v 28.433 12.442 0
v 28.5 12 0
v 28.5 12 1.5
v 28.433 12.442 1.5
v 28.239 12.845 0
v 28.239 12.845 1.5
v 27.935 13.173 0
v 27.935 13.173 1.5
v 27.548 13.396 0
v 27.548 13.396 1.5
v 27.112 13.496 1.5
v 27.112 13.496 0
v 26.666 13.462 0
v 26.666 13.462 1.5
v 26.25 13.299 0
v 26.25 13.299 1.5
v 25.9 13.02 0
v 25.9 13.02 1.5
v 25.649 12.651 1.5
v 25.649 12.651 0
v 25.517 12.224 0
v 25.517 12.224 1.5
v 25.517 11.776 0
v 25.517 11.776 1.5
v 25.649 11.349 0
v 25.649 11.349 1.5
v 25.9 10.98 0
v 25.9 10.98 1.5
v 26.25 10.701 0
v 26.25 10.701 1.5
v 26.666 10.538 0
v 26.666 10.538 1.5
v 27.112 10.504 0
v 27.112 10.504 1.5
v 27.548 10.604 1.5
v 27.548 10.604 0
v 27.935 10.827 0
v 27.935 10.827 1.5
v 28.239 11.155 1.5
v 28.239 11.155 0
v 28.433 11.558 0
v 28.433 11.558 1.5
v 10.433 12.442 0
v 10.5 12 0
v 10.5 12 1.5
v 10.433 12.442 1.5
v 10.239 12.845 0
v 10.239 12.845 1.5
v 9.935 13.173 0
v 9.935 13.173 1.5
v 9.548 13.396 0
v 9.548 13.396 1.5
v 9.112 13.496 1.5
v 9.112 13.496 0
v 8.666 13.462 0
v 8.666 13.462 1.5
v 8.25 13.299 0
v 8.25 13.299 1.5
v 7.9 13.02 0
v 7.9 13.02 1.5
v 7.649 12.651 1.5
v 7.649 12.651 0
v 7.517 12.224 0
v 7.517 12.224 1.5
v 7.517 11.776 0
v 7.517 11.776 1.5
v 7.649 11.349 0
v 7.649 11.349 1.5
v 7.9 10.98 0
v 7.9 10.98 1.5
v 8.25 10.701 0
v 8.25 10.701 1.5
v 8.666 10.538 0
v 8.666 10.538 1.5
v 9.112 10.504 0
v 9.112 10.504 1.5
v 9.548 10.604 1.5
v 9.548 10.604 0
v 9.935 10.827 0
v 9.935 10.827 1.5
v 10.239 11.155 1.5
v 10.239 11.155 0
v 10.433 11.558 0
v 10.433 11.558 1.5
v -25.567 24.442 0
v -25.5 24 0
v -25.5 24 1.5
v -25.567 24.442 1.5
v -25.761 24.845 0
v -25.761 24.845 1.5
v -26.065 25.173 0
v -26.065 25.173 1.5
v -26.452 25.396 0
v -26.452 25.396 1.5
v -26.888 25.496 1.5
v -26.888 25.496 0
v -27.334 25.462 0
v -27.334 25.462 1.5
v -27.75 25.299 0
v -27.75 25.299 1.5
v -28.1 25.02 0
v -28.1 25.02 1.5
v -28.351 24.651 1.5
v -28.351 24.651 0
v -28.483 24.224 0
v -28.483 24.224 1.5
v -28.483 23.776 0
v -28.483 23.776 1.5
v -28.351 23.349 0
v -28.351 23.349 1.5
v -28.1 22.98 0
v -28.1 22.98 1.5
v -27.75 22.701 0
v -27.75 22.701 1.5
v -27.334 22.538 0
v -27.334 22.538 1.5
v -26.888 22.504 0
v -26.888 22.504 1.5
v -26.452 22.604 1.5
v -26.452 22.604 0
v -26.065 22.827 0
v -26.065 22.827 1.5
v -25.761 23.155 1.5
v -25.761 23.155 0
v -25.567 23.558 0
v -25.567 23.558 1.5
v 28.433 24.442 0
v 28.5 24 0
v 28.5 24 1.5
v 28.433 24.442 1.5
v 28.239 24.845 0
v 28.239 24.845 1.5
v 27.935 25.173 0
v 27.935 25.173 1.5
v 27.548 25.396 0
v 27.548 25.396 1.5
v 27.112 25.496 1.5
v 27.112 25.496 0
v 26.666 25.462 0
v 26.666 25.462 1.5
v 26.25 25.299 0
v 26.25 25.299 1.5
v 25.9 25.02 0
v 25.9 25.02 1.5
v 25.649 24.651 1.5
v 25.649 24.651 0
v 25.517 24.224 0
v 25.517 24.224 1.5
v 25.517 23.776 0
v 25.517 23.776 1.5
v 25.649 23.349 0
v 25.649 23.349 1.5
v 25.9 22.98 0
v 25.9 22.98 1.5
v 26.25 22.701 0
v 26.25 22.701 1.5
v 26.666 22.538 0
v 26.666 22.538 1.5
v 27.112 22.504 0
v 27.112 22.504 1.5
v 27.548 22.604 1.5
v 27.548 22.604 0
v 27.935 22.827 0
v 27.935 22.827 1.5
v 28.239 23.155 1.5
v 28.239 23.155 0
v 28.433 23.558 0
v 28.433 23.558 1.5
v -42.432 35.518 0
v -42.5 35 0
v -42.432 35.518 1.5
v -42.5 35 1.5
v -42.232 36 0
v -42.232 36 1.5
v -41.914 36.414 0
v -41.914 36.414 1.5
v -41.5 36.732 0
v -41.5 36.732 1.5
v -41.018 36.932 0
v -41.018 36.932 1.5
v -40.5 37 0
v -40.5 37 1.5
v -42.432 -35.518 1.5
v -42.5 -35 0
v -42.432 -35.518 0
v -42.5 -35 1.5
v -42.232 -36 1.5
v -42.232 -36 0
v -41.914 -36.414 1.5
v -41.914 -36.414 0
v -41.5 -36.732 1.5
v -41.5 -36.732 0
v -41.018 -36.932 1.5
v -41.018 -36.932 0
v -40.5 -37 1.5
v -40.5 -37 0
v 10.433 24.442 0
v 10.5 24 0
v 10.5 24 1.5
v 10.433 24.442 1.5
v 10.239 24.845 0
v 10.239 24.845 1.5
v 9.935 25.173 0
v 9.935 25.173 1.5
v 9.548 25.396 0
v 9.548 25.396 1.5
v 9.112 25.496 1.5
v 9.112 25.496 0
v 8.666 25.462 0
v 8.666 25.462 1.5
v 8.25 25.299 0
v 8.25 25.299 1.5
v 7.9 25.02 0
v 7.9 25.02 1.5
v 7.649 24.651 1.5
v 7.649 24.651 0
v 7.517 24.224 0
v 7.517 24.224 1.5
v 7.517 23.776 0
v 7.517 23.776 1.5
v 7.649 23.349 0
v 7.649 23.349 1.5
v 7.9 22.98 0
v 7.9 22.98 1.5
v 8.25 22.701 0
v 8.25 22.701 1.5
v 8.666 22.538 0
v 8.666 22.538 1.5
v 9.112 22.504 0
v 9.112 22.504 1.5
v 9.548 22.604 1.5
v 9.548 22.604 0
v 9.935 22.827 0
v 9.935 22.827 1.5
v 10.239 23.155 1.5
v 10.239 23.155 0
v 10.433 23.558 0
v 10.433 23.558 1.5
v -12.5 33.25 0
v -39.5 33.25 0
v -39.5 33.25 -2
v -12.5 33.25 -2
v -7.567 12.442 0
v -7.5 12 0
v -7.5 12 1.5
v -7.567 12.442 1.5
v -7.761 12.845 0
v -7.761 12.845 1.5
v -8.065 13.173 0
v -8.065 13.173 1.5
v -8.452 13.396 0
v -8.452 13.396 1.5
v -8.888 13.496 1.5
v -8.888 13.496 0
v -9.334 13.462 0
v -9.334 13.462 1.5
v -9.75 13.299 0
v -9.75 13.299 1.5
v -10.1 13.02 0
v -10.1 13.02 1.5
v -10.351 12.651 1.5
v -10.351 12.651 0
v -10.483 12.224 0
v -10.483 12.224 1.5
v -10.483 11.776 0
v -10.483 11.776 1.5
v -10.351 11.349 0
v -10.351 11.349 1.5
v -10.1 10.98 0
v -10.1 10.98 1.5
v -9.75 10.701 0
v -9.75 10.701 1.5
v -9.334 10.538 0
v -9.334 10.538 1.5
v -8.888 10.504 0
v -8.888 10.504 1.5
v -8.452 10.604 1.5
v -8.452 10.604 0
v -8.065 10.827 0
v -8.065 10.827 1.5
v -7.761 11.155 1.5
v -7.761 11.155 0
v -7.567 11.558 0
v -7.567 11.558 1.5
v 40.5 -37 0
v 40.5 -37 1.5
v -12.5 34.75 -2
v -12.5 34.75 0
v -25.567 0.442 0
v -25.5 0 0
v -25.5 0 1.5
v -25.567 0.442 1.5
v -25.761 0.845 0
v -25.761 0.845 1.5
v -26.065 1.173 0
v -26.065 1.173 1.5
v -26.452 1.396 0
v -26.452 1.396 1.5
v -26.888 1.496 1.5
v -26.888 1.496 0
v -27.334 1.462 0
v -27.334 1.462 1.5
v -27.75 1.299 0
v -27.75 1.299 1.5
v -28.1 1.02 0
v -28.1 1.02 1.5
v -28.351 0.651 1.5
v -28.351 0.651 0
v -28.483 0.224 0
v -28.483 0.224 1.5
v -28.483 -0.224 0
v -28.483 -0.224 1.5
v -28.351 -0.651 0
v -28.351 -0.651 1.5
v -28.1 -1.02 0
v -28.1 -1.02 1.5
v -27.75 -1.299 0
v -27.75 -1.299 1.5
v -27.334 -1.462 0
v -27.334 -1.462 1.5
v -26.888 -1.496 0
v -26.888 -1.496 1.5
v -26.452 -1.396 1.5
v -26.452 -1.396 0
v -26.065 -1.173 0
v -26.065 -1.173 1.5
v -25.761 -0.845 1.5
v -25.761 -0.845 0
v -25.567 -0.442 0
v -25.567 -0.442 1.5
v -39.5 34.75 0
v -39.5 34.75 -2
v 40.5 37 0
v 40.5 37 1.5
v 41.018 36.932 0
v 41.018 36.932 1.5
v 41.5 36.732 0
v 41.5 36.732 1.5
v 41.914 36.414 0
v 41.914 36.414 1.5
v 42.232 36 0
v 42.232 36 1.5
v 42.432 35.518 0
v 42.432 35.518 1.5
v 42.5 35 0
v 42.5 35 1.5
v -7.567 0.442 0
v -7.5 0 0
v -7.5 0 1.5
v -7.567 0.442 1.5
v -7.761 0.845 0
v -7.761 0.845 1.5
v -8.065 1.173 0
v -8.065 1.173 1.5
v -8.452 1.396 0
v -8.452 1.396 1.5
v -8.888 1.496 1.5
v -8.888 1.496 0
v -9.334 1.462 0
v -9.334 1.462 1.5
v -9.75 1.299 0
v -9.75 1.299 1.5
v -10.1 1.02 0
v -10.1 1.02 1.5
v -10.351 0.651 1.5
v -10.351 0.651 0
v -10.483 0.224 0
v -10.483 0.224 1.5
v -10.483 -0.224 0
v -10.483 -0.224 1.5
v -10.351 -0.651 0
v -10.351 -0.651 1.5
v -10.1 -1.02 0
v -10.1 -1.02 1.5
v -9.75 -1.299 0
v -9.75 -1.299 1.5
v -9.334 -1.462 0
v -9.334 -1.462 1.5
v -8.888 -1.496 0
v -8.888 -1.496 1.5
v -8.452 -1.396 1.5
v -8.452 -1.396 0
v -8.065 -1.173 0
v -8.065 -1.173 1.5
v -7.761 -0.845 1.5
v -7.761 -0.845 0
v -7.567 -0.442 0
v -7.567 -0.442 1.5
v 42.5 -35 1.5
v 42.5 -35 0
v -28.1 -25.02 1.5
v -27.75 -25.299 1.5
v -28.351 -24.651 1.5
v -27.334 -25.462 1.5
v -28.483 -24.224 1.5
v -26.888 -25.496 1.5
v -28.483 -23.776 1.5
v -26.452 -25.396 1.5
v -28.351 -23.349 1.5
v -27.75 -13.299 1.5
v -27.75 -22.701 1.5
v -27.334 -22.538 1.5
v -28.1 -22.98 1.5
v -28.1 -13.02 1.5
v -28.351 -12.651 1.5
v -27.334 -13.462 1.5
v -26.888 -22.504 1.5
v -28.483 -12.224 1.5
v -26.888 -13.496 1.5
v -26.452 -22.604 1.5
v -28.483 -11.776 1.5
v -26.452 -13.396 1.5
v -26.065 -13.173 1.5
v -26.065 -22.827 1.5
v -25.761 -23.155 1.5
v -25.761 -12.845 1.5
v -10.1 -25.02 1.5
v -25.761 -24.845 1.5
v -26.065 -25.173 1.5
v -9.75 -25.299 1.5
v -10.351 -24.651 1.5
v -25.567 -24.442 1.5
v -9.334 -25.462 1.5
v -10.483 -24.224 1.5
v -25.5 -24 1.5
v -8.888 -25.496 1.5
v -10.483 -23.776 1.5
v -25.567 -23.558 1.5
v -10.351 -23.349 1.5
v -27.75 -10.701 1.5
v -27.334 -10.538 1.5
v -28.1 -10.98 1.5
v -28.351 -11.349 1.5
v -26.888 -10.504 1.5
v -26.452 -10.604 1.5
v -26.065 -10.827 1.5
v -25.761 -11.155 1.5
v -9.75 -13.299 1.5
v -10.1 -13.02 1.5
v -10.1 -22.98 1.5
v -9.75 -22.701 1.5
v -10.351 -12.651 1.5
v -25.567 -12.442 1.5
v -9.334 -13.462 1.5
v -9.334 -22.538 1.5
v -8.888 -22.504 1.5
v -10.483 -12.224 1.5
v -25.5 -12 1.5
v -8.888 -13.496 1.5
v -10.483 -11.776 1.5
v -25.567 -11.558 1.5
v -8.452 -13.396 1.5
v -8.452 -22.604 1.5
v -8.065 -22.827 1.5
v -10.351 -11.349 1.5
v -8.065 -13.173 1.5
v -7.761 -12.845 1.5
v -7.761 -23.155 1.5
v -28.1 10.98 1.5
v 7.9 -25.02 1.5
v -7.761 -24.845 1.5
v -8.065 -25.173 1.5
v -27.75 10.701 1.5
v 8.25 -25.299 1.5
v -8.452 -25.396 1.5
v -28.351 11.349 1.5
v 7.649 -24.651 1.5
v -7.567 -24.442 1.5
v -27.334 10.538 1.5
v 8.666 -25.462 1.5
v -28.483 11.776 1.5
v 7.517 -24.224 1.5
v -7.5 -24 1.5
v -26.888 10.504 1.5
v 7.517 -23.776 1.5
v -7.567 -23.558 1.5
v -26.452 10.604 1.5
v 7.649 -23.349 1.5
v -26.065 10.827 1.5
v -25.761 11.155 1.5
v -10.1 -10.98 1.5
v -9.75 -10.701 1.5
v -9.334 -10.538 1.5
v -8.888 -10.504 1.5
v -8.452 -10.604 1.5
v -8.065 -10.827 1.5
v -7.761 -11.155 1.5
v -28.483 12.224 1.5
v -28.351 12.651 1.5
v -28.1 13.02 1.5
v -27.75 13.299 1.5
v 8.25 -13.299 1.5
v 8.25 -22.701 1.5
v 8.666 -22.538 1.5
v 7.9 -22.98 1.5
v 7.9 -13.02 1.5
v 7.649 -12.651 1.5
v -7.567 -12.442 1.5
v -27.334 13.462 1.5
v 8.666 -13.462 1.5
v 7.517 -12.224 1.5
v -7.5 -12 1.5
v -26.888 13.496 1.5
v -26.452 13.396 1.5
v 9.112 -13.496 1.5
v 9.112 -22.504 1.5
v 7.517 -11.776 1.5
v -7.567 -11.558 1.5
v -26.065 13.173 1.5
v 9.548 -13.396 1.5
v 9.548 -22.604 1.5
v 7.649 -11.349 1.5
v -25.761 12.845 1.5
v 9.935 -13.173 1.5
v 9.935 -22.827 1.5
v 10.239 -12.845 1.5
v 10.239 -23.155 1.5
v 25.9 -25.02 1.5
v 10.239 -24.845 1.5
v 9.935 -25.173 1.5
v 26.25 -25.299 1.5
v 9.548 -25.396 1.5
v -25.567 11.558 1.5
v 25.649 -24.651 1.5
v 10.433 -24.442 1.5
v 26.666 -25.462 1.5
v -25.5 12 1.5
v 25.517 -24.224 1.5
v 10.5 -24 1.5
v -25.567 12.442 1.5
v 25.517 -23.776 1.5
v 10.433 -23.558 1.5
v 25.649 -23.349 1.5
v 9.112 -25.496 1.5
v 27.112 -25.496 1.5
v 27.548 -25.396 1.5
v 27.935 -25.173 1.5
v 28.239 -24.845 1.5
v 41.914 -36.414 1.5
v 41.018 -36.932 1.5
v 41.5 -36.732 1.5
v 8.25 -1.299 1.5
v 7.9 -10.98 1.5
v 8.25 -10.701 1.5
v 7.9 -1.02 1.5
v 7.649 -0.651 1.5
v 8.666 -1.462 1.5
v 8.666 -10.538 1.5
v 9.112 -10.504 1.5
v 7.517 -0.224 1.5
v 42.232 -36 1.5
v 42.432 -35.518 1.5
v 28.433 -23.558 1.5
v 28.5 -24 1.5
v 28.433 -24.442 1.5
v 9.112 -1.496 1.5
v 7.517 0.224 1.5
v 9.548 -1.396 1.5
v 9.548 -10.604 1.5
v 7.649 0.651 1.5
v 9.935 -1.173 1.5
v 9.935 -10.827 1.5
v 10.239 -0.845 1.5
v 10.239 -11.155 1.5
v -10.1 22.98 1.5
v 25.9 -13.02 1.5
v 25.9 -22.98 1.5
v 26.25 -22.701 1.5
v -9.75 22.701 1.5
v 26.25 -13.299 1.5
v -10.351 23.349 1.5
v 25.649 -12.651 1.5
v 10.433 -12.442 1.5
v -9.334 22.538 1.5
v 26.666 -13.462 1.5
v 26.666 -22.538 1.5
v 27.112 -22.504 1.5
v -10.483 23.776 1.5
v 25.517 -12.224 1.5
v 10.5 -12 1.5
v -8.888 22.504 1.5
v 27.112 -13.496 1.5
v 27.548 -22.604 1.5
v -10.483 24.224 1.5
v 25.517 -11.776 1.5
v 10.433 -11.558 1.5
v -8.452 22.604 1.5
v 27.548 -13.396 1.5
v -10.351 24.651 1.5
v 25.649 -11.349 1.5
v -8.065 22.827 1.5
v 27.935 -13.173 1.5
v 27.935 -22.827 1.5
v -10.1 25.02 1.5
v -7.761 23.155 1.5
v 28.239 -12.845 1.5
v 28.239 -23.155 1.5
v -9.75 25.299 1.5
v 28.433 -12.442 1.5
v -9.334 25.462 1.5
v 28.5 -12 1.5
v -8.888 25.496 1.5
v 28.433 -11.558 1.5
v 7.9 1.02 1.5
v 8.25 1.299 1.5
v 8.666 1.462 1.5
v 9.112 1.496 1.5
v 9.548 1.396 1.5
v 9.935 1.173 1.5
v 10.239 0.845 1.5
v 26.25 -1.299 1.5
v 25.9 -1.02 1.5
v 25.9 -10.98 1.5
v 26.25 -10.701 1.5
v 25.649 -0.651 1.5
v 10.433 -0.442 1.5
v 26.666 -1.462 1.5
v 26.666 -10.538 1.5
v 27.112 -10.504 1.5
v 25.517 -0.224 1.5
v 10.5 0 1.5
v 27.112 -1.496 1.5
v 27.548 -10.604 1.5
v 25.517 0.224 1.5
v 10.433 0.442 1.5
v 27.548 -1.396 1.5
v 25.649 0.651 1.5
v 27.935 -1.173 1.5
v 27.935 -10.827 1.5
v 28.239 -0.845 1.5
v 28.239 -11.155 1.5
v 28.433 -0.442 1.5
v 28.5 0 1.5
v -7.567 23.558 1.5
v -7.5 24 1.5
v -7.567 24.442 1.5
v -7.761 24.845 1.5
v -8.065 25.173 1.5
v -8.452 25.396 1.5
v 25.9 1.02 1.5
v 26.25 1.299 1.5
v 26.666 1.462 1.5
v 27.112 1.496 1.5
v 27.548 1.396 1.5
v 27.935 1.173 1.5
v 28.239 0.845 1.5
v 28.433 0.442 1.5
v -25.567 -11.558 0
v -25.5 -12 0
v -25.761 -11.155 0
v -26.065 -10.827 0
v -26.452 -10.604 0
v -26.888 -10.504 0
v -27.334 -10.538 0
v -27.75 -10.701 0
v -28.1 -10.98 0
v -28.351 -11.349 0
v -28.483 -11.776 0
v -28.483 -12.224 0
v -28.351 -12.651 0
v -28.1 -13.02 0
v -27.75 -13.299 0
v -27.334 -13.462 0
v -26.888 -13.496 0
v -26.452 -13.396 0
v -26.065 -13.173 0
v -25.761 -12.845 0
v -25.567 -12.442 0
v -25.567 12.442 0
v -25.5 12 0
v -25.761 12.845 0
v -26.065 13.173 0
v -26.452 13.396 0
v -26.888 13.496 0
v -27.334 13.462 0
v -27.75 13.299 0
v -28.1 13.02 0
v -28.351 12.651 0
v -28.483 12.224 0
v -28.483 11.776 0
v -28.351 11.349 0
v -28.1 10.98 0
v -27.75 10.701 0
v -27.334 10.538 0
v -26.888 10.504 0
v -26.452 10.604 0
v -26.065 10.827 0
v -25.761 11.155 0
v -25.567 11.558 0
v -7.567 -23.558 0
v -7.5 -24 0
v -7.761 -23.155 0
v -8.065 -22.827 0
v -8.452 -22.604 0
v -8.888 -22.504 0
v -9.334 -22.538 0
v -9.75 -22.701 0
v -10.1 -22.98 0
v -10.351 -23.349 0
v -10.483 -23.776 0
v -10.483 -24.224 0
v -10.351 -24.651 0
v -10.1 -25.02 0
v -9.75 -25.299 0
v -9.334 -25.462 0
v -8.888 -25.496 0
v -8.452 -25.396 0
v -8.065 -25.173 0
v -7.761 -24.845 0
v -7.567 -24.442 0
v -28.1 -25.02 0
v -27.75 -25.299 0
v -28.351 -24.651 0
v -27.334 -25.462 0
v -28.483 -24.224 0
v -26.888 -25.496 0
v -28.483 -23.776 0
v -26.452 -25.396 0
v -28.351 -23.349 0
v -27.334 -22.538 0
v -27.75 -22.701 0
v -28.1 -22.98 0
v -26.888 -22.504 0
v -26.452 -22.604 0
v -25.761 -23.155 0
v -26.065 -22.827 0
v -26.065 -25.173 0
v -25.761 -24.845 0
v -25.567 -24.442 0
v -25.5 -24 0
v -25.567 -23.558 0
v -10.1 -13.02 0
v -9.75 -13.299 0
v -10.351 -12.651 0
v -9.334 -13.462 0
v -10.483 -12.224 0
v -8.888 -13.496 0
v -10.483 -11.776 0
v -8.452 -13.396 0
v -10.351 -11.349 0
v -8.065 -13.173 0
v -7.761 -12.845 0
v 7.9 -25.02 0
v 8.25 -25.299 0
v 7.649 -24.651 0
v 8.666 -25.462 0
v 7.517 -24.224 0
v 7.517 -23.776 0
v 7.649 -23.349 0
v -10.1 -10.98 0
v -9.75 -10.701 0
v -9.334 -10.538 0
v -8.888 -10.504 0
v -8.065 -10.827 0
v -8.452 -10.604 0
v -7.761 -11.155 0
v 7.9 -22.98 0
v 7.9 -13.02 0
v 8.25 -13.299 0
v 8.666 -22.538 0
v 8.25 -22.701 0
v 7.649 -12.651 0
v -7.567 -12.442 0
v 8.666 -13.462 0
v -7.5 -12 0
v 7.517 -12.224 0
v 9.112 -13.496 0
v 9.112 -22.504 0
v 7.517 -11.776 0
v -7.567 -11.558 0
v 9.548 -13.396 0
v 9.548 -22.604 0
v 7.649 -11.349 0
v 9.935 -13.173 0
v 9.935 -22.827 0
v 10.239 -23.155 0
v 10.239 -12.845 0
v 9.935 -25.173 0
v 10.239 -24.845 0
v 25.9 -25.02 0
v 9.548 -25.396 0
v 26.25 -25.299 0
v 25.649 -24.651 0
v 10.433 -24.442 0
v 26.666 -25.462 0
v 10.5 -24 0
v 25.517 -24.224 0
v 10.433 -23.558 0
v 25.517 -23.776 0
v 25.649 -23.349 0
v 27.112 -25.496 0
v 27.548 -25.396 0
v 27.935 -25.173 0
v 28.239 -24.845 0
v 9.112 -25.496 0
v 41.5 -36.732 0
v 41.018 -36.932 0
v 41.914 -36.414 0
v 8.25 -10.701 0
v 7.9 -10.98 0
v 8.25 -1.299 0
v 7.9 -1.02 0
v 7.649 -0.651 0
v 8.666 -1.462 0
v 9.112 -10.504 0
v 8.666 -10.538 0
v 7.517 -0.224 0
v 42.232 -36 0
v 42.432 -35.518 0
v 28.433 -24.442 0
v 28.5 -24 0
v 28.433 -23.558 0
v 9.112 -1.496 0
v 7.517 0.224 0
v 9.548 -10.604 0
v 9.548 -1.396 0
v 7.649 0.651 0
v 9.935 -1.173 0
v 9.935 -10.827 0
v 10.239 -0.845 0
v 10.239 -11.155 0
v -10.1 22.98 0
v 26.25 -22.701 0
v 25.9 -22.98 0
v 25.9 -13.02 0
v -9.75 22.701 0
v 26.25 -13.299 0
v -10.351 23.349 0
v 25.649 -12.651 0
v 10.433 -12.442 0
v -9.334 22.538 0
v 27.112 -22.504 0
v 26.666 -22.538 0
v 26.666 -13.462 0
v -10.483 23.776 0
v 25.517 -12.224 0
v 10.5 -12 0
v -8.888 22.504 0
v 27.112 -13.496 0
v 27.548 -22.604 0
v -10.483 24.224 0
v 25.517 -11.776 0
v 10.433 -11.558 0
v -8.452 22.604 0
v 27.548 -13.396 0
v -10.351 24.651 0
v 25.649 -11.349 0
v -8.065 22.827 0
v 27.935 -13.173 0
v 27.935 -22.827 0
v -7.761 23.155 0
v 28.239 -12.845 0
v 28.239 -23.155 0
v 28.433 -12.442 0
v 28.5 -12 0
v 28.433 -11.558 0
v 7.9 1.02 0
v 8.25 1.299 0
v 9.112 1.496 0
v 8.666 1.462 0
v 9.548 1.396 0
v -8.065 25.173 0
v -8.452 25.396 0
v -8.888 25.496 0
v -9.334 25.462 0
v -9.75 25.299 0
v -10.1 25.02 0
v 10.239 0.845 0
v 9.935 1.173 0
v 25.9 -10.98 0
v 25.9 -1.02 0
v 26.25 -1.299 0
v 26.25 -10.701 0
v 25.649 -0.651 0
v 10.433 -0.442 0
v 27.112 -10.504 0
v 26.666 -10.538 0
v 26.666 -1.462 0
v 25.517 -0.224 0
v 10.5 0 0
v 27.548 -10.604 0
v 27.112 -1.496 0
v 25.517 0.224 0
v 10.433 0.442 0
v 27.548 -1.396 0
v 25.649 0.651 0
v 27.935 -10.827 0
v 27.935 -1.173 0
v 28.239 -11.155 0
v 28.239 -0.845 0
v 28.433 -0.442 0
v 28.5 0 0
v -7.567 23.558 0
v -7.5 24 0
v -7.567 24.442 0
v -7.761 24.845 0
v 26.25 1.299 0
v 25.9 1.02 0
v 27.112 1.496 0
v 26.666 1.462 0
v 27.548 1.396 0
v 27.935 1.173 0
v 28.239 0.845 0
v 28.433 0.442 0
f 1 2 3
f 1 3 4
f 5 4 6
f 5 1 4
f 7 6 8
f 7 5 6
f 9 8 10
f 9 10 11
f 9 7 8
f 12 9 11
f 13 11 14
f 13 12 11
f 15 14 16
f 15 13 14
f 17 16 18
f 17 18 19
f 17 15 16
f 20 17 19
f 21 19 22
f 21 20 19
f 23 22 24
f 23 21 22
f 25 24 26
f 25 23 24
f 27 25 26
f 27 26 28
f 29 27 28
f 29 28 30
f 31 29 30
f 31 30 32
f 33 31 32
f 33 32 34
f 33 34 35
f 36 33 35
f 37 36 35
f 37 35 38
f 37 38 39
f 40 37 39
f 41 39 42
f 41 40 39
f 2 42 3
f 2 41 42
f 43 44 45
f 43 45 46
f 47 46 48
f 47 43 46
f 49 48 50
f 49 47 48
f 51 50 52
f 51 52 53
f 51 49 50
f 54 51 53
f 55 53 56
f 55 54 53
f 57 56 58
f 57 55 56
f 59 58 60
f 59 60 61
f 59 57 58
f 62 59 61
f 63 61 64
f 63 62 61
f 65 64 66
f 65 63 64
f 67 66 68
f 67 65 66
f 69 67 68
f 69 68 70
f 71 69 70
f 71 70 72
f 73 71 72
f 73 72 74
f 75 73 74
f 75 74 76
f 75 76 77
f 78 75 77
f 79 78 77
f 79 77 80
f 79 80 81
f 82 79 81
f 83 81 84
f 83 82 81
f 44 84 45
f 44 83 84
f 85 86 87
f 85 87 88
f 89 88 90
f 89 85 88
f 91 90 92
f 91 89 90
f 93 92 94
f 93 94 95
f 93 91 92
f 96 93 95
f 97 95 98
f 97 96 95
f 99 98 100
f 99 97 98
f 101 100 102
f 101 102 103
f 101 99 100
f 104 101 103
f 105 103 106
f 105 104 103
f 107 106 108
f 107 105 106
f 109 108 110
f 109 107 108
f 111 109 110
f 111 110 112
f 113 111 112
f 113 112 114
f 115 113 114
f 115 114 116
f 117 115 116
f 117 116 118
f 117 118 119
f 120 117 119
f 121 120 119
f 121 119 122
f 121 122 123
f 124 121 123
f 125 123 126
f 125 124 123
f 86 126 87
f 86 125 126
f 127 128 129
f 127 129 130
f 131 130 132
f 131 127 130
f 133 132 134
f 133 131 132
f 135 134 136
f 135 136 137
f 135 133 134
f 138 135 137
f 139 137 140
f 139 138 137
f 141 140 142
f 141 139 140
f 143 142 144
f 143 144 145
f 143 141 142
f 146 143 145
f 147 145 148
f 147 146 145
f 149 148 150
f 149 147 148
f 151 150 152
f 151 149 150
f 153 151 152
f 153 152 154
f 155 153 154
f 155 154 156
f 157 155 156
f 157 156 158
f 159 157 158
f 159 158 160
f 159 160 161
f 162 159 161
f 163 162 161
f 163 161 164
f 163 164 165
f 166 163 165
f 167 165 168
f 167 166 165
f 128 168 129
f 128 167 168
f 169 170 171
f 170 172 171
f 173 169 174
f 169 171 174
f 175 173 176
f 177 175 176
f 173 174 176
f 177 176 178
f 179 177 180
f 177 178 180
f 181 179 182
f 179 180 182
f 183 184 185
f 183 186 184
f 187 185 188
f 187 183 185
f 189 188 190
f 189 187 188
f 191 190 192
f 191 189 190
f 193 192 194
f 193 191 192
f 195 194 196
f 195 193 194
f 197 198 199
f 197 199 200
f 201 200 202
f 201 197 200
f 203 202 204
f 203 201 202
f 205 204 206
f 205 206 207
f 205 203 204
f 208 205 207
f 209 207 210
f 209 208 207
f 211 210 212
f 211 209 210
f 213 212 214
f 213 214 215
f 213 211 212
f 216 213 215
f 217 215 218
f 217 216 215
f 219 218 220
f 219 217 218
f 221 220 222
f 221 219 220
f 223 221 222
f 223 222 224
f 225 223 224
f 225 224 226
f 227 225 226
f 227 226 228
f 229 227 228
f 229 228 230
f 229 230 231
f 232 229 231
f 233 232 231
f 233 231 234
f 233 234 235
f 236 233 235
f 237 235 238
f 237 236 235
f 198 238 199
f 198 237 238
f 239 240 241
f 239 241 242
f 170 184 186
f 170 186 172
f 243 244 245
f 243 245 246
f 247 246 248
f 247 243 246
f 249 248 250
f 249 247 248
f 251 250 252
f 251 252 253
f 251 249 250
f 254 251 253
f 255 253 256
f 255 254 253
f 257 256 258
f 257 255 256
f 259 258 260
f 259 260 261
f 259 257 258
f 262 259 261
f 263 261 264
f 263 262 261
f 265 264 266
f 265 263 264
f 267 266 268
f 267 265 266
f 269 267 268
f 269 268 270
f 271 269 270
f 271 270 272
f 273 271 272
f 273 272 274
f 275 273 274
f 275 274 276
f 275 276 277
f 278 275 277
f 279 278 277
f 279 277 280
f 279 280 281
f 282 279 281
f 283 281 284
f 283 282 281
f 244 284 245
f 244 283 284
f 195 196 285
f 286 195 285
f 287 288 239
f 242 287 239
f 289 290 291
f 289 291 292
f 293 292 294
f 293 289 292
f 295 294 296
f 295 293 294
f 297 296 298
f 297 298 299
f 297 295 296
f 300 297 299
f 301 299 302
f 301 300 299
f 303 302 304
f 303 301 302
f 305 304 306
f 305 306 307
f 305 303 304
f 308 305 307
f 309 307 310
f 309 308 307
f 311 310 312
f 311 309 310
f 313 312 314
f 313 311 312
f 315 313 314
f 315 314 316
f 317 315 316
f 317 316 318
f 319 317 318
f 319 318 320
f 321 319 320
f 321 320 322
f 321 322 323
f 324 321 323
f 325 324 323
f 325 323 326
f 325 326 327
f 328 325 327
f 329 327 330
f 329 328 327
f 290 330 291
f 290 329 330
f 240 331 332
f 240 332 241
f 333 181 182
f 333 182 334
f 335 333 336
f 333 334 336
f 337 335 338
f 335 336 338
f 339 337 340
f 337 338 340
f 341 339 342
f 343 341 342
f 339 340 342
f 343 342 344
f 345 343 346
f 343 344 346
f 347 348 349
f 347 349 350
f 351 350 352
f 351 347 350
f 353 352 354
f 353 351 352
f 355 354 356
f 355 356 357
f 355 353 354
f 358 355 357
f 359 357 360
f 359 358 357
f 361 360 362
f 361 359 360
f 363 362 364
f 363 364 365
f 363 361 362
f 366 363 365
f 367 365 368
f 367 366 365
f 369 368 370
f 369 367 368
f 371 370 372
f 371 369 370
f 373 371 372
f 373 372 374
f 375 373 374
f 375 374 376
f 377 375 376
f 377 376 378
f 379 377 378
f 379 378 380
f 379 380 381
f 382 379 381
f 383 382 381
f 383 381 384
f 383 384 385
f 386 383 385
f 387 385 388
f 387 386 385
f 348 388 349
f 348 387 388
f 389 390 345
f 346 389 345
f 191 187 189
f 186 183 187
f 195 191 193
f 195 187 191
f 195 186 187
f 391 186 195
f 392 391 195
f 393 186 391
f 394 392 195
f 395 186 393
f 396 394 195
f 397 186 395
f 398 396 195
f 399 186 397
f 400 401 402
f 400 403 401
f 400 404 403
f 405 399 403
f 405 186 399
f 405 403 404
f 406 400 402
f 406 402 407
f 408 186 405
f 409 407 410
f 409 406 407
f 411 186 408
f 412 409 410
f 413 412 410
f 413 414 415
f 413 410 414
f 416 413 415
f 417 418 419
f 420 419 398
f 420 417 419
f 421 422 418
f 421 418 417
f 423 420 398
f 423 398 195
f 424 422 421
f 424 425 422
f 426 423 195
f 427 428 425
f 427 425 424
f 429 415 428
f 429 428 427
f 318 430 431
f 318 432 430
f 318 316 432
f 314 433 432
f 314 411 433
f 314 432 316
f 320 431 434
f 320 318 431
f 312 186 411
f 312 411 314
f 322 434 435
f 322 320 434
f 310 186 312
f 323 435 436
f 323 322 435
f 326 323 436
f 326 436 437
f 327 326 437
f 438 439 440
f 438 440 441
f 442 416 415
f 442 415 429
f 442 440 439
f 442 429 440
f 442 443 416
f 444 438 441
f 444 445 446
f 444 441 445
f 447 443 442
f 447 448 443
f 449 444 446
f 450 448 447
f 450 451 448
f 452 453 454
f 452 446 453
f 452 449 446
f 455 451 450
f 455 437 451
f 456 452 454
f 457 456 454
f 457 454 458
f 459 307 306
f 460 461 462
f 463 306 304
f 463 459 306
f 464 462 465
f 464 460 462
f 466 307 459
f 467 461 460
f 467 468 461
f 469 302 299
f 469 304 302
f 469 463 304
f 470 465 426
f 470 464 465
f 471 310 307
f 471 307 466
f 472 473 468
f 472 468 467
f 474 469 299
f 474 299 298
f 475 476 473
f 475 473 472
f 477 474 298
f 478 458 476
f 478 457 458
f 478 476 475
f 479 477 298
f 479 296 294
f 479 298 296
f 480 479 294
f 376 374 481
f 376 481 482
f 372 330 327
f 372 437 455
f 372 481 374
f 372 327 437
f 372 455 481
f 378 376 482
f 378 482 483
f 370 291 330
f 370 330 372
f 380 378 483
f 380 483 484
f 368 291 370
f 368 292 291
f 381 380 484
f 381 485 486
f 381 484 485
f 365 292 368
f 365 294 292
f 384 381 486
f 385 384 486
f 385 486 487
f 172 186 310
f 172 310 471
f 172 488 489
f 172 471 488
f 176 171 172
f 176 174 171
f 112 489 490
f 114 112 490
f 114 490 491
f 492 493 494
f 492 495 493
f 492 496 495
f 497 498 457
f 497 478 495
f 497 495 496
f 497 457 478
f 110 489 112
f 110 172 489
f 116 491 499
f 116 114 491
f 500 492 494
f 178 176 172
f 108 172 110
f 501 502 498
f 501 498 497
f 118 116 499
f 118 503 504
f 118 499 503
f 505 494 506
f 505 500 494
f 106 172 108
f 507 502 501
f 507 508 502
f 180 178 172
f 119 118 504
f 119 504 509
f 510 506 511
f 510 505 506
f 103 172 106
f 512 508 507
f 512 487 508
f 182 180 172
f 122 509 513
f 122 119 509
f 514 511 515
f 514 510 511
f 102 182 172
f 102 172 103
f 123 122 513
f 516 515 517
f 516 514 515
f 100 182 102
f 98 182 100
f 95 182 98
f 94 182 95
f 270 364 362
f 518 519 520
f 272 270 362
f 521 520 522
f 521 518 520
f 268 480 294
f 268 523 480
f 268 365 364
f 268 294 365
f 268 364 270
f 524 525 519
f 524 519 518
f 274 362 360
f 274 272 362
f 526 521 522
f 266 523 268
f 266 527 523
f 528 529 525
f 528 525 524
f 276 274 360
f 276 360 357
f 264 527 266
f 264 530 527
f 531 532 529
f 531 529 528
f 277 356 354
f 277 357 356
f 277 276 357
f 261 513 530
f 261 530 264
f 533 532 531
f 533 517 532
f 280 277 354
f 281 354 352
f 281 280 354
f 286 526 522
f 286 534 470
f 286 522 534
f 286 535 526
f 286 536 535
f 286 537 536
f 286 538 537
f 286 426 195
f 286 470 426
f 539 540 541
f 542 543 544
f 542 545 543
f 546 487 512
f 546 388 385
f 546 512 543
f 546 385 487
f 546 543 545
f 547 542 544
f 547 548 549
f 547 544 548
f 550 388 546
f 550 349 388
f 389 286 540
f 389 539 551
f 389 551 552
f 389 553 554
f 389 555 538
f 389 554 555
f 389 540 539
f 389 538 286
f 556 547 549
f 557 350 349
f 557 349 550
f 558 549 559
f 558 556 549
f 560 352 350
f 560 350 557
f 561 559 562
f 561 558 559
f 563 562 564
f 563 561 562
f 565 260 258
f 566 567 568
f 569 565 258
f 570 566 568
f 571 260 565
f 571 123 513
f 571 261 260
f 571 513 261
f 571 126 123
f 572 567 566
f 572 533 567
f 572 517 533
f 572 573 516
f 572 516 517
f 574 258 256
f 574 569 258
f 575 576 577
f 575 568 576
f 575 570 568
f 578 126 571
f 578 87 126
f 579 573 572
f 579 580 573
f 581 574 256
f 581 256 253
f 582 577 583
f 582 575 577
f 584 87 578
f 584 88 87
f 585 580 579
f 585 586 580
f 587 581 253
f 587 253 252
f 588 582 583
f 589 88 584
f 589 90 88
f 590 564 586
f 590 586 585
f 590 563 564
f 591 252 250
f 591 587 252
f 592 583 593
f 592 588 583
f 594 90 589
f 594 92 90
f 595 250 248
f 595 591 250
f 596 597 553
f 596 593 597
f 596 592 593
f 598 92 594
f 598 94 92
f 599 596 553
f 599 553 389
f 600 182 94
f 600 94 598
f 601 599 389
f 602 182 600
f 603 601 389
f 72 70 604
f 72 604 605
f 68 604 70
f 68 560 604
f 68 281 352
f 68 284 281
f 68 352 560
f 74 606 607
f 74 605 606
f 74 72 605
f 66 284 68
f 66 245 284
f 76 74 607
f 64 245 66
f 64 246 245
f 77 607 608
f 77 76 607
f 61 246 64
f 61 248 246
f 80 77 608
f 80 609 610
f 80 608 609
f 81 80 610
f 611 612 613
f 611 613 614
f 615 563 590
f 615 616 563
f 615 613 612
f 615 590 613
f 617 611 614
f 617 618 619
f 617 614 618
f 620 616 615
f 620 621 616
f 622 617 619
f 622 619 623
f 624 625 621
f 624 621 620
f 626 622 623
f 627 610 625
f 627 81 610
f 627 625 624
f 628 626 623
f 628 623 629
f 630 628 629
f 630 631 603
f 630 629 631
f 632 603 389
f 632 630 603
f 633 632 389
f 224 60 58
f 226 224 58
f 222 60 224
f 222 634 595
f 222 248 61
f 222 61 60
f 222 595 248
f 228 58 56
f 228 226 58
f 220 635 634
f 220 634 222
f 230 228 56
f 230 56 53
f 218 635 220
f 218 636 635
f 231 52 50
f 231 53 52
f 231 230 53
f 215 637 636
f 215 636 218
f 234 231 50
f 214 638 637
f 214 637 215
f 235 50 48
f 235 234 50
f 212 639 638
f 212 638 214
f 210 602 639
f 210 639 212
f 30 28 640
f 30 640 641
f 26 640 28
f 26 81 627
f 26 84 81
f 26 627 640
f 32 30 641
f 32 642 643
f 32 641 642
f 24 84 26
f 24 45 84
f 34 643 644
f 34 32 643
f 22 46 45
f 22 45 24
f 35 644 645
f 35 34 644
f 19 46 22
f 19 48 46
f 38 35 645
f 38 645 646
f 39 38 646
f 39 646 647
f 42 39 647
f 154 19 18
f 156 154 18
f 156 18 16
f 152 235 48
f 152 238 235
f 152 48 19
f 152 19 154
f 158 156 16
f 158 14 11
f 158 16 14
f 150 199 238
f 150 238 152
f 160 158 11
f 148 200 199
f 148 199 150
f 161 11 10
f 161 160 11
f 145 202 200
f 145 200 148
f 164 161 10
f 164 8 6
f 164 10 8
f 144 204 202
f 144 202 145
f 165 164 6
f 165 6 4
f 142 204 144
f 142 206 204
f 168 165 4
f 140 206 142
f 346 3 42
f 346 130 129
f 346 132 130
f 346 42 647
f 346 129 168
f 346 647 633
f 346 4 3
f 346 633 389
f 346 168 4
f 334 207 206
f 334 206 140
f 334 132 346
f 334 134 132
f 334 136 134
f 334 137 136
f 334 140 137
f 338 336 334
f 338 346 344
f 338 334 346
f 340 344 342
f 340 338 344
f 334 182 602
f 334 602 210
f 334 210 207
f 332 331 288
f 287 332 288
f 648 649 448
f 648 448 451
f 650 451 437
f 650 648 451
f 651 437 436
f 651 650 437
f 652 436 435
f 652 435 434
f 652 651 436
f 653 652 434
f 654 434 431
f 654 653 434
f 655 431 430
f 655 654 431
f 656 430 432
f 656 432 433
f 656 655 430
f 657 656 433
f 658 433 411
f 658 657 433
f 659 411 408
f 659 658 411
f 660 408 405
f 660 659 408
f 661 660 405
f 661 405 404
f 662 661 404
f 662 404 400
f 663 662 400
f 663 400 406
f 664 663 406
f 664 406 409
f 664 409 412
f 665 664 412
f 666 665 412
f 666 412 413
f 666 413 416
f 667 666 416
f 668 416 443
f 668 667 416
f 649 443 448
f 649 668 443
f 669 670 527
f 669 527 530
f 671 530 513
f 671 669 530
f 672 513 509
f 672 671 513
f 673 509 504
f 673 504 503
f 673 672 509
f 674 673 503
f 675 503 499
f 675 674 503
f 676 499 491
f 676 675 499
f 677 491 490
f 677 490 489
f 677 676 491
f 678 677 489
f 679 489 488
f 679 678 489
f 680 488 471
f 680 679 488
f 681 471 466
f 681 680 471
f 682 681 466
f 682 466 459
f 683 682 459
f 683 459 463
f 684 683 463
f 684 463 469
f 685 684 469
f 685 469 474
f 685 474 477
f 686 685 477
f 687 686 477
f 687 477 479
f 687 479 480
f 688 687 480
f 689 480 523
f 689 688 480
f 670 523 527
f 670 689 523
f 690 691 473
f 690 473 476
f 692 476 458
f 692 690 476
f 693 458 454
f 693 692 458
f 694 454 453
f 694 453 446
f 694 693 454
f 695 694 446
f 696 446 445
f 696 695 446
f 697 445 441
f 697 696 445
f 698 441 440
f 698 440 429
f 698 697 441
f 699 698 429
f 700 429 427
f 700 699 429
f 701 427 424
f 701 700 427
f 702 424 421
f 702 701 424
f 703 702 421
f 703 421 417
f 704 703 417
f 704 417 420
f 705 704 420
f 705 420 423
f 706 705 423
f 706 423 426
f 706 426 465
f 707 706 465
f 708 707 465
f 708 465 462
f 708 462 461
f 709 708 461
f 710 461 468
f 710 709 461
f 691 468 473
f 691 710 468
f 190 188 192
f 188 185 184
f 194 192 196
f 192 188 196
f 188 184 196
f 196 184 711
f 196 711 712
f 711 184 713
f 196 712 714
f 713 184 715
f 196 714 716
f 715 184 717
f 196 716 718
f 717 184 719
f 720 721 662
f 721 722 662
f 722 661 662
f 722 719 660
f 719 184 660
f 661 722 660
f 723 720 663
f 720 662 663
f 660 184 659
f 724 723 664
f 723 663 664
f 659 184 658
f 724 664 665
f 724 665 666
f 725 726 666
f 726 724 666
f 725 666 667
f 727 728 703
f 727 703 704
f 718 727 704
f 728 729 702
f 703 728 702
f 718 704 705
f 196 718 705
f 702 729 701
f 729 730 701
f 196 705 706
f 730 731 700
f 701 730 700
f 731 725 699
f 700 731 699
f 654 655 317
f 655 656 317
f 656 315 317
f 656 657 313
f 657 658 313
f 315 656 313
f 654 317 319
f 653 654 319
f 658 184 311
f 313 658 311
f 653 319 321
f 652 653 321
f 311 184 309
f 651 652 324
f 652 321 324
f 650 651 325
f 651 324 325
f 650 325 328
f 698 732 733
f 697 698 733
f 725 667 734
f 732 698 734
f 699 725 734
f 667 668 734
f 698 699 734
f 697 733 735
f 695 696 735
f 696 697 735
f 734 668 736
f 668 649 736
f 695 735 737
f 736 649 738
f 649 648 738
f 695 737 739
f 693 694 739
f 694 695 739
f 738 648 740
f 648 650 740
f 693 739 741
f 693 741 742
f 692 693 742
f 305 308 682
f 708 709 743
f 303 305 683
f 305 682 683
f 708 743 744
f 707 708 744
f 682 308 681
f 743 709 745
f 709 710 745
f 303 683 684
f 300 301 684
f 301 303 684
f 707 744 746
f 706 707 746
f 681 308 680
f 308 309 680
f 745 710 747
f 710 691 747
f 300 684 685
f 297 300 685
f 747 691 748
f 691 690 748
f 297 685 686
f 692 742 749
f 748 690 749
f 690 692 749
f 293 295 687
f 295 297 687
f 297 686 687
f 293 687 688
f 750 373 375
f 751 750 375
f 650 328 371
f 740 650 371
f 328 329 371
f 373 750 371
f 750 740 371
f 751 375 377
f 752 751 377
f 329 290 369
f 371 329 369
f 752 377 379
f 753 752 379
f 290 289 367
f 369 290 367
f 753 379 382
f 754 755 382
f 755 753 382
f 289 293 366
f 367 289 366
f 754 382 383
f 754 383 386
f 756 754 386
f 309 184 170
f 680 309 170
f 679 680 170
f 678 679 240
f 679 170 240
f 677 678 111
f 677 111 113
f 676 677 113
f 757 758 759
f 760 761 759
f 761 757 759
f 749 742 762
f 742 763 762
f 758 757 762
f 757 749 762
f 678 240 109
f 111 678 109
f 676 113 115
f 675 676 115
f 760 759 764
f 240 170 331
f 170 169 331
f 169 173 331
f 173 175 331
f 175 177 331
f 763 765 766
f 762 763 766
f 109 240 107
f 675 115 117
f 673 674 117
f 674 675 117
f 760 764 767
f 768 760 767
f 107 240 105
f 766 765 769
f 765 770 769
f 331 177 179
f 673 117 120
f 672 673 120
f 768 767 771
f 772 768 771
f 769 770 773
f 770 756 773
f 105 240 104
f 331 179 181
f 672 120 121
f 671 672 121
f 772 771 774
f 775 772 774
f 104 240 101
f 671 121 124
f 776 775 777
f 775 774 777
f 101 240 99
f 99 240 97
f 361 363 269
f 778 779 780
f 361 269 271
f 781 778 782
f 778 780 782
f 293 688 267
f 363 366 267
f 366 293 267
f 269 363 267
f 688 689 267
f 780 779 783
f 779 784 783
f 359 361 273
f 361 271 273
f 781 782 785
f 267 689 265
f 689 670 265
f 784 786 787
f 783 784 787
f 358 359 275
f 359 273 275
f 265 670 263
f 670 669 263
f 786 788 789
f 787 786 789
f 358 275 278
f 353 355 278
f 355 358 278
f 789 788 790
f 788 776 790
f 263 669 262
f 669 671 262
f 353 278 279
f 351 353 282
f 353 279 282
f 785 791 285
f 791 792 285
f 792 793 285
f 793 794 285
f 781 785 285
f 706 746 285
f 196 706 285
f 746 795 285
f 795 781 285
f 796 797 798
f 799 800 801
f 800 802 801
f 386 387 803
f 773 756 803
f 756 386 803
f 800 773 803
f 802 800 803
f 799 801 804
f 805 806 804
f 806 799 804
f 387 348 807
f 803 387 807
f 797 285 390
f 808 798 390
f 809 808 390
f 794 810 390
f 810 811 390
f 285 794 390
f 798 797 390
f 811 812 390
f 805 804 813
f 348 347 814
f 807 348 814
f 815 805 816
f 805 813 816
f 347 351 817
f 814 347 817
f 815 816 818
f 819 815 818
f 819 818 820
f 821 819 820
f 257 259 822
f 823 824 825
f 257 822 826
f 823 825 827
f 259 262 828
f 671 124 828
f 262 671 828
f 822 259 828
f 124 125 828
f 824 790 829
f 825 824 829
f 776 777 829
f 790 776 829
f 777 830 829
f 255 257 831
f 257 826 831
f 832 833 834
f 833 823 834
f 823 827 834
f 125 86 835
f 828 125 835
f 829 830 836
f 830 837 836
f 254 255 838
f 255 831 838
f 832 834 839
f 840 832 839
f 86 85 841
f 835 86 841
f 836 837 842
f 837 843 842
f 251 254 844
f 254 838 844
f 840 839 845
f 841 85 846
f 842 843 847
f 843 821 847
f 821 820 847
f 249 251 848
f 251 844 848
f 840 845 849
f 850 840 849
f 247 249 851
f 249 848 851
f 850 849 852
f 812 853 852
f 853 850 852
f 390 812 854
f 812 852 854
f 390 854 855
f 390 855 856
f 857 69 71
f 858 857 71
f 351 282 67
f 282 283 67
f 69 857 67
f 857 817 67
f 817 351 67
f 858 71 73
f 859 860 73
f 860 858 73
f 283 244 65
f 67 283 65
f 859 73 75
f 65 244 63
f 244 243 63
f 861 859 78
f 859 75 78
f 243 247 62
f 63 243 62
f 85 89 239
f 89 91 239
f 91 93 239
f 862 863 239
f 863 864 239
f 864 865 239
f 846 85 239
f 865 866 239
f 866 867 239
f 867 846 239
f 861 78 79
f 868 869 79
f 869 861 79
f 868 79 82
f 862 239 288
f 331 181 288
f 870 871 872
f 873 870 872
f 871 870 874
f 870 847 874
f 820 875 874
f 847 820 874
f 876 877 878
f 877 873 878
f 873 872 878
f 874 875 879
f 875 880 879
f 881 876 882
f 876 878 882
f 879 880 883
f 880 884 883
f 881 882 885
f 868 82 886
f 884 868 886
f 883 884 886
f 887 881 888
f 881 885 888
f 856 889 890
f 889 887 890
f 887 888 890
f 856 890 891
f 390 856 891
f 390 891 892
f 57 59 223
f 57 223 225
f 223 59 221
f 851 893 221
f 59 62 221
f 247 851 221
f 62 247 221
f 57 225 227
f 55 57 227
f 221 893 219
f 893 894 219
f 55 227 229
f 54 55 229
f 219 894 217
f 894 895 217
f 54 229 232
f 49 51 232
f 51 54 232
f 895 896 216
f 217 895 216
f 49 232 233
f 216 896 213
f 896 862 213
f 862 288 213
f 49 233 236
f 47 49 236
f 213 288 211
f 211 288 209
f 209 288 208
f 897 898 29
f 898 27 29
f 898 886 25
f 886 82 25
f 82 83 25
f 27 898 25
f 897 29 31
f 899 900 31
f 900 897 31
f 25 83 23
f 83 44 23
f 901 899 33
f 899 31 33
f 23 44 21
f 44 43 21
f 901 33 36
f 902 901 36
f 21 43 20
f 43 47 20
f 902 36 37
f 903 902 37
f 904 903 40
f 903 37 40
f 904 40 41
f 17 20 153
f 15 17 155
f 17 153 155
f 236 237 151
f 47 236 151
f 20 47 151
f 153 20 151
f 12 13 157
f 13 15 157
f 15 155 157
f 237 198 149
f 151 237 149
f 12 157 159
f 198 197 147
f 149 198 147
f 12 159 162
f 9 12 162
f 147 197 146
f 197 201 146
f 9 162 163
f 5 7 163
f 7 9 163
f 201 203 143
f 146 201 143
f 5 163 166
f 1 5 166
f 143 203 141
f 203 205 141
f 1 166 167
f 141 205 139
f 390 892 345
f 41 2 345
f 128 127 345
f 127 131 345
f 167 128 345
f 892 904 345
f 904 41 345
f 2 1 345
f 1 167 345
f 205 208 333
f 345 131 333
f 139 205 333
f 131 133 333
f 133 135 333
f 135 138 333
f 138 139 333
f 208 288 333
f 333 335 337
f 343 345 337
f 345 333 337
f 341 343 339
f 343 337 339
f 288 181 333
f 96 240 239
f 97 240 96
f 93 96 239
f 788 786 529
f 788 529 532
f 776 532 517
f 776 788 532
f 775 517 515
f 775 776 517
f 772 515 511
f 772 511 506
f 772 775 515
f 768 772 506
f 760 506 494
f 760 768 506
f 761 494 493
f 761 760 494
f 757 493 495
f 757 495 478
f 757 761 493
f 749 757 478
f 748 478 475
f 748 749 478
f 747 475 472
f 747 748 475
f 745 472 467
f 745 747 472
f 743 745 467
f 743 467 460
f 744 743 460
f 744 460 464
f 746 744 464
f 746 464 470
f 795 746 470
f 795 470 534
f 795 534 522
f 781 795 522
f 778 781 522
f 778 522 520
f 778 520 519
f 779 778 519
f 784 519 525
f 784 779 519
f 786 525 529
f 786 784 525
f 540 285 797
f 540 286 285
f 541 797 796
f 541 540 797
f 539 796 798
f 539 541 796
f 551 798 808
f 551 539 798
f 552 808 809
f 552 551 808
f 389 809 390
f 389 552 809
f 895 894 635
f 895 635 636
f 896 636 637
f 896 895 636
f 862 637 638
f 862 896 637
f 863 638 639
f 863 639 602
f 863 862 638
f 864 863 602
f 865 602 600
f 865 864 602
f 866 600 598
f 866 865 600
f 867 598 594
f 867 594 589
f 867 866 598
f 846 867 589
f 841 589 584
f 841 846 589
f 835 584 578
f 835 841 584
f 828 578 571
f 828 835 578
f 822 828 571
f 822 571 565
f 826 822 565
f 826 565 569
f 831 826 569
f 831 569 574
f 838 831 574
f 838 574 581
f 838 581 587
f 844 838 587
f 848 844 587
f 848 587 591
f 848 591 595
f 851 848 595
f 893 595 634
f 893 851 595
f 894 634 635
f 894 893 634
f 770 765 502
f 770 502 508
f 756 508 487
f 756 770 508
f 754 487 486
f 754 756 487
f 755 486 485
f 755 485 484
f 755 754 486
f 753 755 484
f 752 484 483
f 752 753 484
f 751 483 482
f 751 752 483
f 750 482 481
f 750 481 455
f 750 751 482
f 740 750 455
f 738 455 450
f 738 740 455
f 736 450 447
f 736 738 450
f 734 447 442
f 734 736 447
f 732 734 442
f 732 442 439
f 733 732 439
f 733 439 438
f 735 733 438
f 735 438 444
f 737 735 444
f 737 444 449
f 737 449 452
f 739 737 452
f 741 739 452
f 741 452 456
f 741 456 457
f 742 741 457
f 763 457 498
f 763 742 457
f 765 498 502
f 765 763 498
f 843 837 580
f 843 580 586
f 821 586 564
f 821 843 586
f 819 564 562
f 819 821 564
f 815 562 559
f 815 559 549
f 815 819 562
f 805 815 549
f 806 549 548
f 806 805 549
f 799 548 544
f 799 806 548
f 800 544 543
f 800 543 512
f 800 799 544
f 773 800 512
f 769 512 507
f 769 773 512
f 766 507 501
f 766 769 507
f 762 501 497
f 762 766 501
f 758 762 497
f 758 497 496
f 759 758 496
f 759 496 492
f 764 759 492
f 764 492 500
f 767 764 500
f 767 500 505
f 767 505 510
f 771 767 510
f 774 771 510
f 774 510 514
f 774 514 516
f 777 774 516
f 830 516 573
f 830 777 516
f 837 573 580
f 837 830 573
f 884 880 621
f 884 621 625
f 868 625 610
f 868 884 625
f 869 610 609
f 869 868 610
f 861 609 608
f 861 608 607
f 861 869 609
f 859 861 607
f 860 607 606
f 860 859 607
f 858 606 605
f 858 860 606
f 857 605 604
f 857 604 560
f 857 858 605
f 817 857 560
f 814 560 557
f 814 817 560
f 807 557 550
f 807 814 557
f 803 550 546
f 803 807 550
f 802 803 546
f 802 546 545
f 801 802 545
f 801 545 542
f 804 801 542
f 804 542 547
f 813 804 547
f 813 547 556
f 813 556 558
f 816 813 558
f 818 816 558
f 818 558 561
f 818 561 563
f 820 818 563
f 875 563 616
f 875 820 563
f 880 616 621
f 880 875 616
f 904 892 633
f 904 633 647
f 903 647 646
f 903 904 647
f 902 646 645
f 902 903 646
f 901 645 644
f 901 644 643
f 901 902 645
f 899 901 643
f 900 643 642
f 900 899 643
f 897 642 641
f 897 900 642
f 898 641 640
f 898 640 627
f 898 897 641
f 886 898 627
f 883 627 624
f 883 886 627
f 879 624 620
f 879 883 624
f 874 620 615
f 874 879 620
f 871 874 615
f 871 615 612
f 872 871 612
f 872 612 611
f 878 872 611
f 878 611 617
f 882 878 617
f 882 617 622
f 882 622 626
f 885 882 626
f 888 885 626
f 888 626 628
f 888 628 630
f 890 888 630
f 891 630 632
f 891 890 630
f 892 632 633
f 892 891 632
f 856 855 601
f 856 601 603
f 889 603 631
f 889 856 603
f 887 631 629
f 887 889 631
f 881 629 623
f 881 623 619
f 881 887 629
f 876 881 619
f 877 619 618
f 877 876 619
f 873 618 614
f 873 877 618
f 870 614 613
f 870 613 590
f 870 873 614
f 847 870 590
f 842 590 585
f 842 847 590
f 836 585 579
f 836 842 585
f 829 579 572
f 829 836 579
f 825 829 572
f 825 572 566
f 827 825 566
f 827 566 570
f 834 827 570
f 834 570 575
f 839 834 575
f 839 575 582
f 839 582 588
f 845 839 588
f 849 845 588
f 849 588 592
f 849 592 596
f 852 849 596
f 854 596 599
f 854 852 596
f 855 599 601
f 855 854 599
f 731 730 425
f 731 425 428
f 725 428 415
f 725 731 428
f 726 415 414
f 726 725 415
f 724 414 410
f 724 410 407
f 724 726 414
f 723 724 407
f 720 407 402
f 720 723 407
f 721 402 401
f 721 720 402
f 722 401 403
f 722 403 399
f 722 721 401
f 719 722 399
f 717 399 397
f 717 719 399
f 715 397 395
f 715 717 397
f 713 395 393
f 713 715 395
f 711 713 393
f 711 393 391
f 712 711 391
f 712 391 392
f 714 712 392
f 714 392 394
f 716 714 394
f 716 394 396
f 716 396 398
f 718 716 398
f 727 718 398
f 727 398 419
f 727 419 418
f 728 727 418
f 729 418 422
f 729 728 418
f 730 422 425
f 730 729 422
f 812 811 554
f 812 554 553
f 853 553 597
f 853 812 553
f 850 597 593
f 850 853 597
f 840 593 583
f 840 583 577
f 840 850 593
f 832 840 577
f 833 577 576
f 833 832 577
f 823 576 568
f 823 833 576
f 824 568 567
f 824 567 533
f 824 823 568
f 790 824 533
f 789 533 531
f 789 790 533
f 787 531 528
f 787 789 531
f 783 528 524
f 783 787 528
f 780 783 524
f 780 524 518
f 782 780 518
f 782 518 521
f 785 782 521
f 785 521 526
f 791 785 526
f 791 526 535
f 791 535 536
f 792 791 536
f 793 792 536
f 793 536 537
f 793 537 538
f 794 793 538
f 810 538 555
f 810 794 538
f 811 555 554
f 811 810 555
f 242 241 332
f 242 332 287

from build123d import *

# Parameters (mm, degrees)
SKETCH001_W  = 85
SKETCH001_H  = 74
SKETCH001_R  = 1.5
PAD_DEPTH    = 1.5
FILLET_R     = 2
SKETCH_W     = 27
SKETCH_H     = 1.5
PAD001_DEPTH = 2


with BuildPart() as part:
    # Sketch001 → Pad (new body)
    with BuildSketch(Plane.XY):
        Rectangle(SKETCH001_W, SKETCH001_H)
        with Locations((-27, 24)):
            Circle(SKETCH001_R, mode=Mode.SUBTRACT)
        with Locations((-9, 24)):
            Circle(SKETCH001_R, mode=Mode.SUBTRACT)
        with Locations((9, 24)):
            Circle(SKETCH001_R, mode=Mode.SUBTRACT)
        with Locations((27, 24)):
            Circle(SKETCH001_R, mode=Mode.SUBTRACT)
        with Locations((-27, 12)):
            Circle(SKETCH001_R, mode=Mode.SUBTRACT)
        with Locations((-9, 12)):
            Circle(SKETCH001_R, mode=Mode.SUBTRACT)
        with Locations((9, 12)):
            Circle(SKETCH001_R, mode=Mode.SUBTRACT)
        with Locations((27, 12)):
            Circle(SKETCH001_R, mode=Mode.SUBTRACT)
        with Locations((-27, 0)):
            Circle(SKETCH001_R, mode=Mode.SUBTRACT)
        with Locations((-9, 0)):
            Circle(SKETCH001_R, mode=Mode.SUBTRACT)
        with Locations((9, 0)):
            Circle(SKETCH001_R, mode=Mode.SUBTRACT)
        with Locations((27, 0)):
            Circle(SKETCH001_R, mode=Mode.SUBTRACT)
        with Locations((-27, -12)):
            Circle(SKETCH001_R, mode=Mode.SUBTRACT)
        with Locations((-9, -12)):
            Circle(SKETCH001_R, mode=Mode.SUBTRACT)
        with Locations((9, -12)):
            Circle(SKETCH001_R, mode=Mode.SUBTRACT)
        with Locations((27, -12)):
            Circle(SKETCH001_R, mode=Mode.SUBTRACT)
        with Locations((-27, -24)):
            Circle(SKETCH001_R, mode=Mode.SUBTRACT)
        with Locations((-9, -24)):
            Circle(SKETCH001_R, mode=Mode.SUBTRACT)
        with Locations((9, -24)):
            Circle(SKETCH001_R, mode=Mode.SUBTRACT)
        with Locations((27, -24)):
            Circle(SKETCH001_R, mode=Mode.SUBTRACT)
    extrude(amount=PAD_DEPTH)

    # Fillet
    fillet_edges = [part.edges().sort_by_distance(p)[0] for p in [
        (-42.5, 37, 0.75),
        (42.5, -37, 0.75),
        (-42.5, -37, 0.75),
        (42.5, 37, 0.75),
    ]]
    fillet(fillet_edges, radius=FILLET_R)

    # Sketch (on Face2 of Fillet) → Pad001 (join)
    with BuildSketch(Plane(origin=(0, 0, 0), x_dir=(1, 0, 0), z_dir=(0, 0, -1))):
        with Locations((-26, -34)):
            Rectangle(SKETCH_W, SKETCH_H)
    extrude(amount=PAD001_DEPTH)


solid = part.part
